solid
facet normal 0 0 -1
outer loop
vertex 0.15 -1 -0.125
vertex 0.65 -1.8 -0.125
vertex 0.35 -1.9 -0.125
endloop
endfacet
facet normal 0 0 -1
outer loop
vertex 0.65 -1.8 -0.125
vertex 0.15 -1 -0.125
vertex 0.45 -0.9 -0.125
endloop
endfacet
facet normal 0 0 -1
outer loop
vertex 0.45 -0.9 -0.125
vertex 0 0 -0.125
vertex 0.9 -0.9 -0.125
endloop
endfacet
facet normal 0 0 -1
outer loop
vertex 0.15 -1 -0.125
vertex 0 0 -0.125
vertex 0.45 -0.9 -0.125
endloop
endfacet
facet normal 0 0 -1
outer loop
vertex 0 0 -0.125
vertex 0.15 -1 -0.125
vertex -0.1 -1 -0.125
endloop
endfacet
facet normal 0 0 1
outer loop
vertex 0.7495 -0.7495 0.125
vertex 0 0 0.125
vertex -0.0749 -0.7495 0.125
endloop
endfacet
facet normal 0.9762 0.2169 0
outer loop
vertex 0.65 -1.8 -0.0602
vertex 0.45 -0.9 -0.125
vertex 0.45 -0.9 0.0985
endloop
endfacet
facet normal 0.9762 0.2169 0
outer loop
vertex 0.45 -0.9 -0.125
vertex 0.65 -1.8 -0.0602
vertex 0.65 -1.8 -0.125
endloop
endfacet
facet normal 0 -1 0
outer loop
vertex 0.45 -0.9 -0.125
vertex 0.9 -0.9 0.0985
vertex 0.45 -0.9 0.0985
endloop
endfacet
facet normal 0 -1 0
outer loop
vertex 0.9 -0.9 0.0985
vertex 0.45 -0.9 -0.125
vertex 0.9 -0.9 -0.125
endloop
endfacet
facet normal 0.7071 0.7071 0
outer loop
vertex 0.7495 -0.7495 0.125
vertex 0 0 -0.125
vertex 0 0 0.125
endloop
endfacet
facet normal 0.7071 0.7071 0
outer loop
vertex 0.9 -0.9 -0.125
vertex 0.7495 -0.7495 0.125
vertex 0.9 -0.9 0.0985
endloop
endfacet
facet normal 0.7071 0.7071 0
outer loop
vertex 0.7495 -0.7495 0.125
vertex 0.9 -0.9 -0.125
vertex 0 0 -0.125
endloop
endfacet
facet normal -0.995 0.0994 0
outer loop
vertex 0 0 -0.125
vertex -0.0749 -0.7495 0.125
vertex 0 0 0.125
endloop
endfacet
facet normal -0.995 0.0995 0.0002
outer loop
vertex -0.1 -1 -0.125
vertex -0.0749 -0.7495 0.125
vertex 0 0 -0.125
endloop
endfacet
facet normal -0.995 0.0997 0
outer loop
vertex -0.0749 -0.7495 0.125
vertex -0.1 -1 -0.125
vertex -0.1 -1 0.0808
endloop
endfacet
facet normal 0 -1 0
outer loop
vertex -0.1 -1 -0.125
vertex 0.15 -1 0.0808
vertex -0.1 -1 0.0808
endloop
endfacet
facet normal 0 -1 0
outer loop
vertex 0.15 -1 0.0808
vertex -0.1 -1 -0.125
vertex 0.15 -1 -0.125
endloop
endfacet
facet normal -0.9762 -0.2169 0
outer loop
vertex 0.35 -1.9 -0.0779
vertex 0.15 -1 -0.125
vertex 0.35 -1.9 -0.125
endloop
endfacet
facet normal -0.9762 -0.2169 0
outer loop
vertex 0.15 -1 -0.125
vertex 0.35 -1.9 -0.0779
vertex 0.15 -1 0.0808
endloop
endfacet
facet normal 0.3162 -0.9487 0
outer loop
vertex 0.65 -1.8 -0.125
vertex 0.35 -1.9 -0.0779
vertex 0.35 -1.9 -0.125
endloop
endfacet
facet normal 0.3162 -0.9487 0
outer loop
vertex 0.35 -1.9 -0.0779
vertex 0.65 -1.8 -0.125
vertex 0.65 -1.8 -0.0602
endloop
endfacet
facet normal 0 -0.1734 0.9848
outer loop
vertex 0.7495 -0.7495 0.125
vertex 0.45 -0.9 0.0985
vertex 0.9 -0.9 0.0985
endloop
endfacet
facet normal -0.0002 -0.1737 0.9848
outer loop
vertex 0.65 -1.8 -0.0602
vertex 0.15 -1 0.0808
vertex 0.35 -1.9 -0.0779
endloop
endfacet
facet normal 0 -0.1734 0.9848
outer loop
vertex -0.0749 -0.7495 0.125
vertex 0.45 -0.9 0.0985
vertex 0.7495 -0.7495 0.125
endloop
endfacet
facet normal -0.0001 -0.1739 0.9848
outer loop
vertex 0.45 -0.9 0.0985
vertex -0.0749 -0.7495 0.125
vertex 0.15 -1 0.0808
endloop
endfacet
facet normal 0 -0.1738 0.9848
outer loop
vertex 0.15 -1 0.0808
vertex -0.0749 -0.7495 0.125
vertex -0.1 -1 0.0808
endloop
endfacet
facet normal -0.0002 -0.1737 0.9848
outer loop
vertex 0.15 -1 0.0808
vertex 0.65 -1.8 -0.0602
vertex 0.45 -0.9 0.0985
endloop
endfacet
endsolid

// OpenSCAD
// cursor_pointer.scad
// Sleek, beveled 3D cursor pointer with origin at the active tip (0, 0, 0).
// Authored for WoWViewer in-scene 3D spatial UI.

$fn = 24;

module cursor_pointer() {
    // Tip is at (0, 0, 0), arrow extends along +X (right) and -Y (down)
    difference() {
        // Main faceted arrow body
        linear_extrude(height = 0.25, center = true, convexity = 10)
        polygon(points = [
            [0.0, 0.0],       // Tip
            [0.9, -0.9],      // Bottom right edge
            [0.45, -0.9],     // Inner notch right
            [0.65, -1.8],     // Tail bottom right
            [0.35, -1.9],     // Tail bottom left
            [0.15, -1.0],     // Tail inner left
            [-0.1, -1.0]      // Far left wing
        ]);

        // Bevel top face slightly along Z
        translate([0, -0.9, 0.2])
        rotate([10, 0, 0])
        cube([2.5, 2.5, 0.2], center = true);
    }
}

cursor_pointer();
